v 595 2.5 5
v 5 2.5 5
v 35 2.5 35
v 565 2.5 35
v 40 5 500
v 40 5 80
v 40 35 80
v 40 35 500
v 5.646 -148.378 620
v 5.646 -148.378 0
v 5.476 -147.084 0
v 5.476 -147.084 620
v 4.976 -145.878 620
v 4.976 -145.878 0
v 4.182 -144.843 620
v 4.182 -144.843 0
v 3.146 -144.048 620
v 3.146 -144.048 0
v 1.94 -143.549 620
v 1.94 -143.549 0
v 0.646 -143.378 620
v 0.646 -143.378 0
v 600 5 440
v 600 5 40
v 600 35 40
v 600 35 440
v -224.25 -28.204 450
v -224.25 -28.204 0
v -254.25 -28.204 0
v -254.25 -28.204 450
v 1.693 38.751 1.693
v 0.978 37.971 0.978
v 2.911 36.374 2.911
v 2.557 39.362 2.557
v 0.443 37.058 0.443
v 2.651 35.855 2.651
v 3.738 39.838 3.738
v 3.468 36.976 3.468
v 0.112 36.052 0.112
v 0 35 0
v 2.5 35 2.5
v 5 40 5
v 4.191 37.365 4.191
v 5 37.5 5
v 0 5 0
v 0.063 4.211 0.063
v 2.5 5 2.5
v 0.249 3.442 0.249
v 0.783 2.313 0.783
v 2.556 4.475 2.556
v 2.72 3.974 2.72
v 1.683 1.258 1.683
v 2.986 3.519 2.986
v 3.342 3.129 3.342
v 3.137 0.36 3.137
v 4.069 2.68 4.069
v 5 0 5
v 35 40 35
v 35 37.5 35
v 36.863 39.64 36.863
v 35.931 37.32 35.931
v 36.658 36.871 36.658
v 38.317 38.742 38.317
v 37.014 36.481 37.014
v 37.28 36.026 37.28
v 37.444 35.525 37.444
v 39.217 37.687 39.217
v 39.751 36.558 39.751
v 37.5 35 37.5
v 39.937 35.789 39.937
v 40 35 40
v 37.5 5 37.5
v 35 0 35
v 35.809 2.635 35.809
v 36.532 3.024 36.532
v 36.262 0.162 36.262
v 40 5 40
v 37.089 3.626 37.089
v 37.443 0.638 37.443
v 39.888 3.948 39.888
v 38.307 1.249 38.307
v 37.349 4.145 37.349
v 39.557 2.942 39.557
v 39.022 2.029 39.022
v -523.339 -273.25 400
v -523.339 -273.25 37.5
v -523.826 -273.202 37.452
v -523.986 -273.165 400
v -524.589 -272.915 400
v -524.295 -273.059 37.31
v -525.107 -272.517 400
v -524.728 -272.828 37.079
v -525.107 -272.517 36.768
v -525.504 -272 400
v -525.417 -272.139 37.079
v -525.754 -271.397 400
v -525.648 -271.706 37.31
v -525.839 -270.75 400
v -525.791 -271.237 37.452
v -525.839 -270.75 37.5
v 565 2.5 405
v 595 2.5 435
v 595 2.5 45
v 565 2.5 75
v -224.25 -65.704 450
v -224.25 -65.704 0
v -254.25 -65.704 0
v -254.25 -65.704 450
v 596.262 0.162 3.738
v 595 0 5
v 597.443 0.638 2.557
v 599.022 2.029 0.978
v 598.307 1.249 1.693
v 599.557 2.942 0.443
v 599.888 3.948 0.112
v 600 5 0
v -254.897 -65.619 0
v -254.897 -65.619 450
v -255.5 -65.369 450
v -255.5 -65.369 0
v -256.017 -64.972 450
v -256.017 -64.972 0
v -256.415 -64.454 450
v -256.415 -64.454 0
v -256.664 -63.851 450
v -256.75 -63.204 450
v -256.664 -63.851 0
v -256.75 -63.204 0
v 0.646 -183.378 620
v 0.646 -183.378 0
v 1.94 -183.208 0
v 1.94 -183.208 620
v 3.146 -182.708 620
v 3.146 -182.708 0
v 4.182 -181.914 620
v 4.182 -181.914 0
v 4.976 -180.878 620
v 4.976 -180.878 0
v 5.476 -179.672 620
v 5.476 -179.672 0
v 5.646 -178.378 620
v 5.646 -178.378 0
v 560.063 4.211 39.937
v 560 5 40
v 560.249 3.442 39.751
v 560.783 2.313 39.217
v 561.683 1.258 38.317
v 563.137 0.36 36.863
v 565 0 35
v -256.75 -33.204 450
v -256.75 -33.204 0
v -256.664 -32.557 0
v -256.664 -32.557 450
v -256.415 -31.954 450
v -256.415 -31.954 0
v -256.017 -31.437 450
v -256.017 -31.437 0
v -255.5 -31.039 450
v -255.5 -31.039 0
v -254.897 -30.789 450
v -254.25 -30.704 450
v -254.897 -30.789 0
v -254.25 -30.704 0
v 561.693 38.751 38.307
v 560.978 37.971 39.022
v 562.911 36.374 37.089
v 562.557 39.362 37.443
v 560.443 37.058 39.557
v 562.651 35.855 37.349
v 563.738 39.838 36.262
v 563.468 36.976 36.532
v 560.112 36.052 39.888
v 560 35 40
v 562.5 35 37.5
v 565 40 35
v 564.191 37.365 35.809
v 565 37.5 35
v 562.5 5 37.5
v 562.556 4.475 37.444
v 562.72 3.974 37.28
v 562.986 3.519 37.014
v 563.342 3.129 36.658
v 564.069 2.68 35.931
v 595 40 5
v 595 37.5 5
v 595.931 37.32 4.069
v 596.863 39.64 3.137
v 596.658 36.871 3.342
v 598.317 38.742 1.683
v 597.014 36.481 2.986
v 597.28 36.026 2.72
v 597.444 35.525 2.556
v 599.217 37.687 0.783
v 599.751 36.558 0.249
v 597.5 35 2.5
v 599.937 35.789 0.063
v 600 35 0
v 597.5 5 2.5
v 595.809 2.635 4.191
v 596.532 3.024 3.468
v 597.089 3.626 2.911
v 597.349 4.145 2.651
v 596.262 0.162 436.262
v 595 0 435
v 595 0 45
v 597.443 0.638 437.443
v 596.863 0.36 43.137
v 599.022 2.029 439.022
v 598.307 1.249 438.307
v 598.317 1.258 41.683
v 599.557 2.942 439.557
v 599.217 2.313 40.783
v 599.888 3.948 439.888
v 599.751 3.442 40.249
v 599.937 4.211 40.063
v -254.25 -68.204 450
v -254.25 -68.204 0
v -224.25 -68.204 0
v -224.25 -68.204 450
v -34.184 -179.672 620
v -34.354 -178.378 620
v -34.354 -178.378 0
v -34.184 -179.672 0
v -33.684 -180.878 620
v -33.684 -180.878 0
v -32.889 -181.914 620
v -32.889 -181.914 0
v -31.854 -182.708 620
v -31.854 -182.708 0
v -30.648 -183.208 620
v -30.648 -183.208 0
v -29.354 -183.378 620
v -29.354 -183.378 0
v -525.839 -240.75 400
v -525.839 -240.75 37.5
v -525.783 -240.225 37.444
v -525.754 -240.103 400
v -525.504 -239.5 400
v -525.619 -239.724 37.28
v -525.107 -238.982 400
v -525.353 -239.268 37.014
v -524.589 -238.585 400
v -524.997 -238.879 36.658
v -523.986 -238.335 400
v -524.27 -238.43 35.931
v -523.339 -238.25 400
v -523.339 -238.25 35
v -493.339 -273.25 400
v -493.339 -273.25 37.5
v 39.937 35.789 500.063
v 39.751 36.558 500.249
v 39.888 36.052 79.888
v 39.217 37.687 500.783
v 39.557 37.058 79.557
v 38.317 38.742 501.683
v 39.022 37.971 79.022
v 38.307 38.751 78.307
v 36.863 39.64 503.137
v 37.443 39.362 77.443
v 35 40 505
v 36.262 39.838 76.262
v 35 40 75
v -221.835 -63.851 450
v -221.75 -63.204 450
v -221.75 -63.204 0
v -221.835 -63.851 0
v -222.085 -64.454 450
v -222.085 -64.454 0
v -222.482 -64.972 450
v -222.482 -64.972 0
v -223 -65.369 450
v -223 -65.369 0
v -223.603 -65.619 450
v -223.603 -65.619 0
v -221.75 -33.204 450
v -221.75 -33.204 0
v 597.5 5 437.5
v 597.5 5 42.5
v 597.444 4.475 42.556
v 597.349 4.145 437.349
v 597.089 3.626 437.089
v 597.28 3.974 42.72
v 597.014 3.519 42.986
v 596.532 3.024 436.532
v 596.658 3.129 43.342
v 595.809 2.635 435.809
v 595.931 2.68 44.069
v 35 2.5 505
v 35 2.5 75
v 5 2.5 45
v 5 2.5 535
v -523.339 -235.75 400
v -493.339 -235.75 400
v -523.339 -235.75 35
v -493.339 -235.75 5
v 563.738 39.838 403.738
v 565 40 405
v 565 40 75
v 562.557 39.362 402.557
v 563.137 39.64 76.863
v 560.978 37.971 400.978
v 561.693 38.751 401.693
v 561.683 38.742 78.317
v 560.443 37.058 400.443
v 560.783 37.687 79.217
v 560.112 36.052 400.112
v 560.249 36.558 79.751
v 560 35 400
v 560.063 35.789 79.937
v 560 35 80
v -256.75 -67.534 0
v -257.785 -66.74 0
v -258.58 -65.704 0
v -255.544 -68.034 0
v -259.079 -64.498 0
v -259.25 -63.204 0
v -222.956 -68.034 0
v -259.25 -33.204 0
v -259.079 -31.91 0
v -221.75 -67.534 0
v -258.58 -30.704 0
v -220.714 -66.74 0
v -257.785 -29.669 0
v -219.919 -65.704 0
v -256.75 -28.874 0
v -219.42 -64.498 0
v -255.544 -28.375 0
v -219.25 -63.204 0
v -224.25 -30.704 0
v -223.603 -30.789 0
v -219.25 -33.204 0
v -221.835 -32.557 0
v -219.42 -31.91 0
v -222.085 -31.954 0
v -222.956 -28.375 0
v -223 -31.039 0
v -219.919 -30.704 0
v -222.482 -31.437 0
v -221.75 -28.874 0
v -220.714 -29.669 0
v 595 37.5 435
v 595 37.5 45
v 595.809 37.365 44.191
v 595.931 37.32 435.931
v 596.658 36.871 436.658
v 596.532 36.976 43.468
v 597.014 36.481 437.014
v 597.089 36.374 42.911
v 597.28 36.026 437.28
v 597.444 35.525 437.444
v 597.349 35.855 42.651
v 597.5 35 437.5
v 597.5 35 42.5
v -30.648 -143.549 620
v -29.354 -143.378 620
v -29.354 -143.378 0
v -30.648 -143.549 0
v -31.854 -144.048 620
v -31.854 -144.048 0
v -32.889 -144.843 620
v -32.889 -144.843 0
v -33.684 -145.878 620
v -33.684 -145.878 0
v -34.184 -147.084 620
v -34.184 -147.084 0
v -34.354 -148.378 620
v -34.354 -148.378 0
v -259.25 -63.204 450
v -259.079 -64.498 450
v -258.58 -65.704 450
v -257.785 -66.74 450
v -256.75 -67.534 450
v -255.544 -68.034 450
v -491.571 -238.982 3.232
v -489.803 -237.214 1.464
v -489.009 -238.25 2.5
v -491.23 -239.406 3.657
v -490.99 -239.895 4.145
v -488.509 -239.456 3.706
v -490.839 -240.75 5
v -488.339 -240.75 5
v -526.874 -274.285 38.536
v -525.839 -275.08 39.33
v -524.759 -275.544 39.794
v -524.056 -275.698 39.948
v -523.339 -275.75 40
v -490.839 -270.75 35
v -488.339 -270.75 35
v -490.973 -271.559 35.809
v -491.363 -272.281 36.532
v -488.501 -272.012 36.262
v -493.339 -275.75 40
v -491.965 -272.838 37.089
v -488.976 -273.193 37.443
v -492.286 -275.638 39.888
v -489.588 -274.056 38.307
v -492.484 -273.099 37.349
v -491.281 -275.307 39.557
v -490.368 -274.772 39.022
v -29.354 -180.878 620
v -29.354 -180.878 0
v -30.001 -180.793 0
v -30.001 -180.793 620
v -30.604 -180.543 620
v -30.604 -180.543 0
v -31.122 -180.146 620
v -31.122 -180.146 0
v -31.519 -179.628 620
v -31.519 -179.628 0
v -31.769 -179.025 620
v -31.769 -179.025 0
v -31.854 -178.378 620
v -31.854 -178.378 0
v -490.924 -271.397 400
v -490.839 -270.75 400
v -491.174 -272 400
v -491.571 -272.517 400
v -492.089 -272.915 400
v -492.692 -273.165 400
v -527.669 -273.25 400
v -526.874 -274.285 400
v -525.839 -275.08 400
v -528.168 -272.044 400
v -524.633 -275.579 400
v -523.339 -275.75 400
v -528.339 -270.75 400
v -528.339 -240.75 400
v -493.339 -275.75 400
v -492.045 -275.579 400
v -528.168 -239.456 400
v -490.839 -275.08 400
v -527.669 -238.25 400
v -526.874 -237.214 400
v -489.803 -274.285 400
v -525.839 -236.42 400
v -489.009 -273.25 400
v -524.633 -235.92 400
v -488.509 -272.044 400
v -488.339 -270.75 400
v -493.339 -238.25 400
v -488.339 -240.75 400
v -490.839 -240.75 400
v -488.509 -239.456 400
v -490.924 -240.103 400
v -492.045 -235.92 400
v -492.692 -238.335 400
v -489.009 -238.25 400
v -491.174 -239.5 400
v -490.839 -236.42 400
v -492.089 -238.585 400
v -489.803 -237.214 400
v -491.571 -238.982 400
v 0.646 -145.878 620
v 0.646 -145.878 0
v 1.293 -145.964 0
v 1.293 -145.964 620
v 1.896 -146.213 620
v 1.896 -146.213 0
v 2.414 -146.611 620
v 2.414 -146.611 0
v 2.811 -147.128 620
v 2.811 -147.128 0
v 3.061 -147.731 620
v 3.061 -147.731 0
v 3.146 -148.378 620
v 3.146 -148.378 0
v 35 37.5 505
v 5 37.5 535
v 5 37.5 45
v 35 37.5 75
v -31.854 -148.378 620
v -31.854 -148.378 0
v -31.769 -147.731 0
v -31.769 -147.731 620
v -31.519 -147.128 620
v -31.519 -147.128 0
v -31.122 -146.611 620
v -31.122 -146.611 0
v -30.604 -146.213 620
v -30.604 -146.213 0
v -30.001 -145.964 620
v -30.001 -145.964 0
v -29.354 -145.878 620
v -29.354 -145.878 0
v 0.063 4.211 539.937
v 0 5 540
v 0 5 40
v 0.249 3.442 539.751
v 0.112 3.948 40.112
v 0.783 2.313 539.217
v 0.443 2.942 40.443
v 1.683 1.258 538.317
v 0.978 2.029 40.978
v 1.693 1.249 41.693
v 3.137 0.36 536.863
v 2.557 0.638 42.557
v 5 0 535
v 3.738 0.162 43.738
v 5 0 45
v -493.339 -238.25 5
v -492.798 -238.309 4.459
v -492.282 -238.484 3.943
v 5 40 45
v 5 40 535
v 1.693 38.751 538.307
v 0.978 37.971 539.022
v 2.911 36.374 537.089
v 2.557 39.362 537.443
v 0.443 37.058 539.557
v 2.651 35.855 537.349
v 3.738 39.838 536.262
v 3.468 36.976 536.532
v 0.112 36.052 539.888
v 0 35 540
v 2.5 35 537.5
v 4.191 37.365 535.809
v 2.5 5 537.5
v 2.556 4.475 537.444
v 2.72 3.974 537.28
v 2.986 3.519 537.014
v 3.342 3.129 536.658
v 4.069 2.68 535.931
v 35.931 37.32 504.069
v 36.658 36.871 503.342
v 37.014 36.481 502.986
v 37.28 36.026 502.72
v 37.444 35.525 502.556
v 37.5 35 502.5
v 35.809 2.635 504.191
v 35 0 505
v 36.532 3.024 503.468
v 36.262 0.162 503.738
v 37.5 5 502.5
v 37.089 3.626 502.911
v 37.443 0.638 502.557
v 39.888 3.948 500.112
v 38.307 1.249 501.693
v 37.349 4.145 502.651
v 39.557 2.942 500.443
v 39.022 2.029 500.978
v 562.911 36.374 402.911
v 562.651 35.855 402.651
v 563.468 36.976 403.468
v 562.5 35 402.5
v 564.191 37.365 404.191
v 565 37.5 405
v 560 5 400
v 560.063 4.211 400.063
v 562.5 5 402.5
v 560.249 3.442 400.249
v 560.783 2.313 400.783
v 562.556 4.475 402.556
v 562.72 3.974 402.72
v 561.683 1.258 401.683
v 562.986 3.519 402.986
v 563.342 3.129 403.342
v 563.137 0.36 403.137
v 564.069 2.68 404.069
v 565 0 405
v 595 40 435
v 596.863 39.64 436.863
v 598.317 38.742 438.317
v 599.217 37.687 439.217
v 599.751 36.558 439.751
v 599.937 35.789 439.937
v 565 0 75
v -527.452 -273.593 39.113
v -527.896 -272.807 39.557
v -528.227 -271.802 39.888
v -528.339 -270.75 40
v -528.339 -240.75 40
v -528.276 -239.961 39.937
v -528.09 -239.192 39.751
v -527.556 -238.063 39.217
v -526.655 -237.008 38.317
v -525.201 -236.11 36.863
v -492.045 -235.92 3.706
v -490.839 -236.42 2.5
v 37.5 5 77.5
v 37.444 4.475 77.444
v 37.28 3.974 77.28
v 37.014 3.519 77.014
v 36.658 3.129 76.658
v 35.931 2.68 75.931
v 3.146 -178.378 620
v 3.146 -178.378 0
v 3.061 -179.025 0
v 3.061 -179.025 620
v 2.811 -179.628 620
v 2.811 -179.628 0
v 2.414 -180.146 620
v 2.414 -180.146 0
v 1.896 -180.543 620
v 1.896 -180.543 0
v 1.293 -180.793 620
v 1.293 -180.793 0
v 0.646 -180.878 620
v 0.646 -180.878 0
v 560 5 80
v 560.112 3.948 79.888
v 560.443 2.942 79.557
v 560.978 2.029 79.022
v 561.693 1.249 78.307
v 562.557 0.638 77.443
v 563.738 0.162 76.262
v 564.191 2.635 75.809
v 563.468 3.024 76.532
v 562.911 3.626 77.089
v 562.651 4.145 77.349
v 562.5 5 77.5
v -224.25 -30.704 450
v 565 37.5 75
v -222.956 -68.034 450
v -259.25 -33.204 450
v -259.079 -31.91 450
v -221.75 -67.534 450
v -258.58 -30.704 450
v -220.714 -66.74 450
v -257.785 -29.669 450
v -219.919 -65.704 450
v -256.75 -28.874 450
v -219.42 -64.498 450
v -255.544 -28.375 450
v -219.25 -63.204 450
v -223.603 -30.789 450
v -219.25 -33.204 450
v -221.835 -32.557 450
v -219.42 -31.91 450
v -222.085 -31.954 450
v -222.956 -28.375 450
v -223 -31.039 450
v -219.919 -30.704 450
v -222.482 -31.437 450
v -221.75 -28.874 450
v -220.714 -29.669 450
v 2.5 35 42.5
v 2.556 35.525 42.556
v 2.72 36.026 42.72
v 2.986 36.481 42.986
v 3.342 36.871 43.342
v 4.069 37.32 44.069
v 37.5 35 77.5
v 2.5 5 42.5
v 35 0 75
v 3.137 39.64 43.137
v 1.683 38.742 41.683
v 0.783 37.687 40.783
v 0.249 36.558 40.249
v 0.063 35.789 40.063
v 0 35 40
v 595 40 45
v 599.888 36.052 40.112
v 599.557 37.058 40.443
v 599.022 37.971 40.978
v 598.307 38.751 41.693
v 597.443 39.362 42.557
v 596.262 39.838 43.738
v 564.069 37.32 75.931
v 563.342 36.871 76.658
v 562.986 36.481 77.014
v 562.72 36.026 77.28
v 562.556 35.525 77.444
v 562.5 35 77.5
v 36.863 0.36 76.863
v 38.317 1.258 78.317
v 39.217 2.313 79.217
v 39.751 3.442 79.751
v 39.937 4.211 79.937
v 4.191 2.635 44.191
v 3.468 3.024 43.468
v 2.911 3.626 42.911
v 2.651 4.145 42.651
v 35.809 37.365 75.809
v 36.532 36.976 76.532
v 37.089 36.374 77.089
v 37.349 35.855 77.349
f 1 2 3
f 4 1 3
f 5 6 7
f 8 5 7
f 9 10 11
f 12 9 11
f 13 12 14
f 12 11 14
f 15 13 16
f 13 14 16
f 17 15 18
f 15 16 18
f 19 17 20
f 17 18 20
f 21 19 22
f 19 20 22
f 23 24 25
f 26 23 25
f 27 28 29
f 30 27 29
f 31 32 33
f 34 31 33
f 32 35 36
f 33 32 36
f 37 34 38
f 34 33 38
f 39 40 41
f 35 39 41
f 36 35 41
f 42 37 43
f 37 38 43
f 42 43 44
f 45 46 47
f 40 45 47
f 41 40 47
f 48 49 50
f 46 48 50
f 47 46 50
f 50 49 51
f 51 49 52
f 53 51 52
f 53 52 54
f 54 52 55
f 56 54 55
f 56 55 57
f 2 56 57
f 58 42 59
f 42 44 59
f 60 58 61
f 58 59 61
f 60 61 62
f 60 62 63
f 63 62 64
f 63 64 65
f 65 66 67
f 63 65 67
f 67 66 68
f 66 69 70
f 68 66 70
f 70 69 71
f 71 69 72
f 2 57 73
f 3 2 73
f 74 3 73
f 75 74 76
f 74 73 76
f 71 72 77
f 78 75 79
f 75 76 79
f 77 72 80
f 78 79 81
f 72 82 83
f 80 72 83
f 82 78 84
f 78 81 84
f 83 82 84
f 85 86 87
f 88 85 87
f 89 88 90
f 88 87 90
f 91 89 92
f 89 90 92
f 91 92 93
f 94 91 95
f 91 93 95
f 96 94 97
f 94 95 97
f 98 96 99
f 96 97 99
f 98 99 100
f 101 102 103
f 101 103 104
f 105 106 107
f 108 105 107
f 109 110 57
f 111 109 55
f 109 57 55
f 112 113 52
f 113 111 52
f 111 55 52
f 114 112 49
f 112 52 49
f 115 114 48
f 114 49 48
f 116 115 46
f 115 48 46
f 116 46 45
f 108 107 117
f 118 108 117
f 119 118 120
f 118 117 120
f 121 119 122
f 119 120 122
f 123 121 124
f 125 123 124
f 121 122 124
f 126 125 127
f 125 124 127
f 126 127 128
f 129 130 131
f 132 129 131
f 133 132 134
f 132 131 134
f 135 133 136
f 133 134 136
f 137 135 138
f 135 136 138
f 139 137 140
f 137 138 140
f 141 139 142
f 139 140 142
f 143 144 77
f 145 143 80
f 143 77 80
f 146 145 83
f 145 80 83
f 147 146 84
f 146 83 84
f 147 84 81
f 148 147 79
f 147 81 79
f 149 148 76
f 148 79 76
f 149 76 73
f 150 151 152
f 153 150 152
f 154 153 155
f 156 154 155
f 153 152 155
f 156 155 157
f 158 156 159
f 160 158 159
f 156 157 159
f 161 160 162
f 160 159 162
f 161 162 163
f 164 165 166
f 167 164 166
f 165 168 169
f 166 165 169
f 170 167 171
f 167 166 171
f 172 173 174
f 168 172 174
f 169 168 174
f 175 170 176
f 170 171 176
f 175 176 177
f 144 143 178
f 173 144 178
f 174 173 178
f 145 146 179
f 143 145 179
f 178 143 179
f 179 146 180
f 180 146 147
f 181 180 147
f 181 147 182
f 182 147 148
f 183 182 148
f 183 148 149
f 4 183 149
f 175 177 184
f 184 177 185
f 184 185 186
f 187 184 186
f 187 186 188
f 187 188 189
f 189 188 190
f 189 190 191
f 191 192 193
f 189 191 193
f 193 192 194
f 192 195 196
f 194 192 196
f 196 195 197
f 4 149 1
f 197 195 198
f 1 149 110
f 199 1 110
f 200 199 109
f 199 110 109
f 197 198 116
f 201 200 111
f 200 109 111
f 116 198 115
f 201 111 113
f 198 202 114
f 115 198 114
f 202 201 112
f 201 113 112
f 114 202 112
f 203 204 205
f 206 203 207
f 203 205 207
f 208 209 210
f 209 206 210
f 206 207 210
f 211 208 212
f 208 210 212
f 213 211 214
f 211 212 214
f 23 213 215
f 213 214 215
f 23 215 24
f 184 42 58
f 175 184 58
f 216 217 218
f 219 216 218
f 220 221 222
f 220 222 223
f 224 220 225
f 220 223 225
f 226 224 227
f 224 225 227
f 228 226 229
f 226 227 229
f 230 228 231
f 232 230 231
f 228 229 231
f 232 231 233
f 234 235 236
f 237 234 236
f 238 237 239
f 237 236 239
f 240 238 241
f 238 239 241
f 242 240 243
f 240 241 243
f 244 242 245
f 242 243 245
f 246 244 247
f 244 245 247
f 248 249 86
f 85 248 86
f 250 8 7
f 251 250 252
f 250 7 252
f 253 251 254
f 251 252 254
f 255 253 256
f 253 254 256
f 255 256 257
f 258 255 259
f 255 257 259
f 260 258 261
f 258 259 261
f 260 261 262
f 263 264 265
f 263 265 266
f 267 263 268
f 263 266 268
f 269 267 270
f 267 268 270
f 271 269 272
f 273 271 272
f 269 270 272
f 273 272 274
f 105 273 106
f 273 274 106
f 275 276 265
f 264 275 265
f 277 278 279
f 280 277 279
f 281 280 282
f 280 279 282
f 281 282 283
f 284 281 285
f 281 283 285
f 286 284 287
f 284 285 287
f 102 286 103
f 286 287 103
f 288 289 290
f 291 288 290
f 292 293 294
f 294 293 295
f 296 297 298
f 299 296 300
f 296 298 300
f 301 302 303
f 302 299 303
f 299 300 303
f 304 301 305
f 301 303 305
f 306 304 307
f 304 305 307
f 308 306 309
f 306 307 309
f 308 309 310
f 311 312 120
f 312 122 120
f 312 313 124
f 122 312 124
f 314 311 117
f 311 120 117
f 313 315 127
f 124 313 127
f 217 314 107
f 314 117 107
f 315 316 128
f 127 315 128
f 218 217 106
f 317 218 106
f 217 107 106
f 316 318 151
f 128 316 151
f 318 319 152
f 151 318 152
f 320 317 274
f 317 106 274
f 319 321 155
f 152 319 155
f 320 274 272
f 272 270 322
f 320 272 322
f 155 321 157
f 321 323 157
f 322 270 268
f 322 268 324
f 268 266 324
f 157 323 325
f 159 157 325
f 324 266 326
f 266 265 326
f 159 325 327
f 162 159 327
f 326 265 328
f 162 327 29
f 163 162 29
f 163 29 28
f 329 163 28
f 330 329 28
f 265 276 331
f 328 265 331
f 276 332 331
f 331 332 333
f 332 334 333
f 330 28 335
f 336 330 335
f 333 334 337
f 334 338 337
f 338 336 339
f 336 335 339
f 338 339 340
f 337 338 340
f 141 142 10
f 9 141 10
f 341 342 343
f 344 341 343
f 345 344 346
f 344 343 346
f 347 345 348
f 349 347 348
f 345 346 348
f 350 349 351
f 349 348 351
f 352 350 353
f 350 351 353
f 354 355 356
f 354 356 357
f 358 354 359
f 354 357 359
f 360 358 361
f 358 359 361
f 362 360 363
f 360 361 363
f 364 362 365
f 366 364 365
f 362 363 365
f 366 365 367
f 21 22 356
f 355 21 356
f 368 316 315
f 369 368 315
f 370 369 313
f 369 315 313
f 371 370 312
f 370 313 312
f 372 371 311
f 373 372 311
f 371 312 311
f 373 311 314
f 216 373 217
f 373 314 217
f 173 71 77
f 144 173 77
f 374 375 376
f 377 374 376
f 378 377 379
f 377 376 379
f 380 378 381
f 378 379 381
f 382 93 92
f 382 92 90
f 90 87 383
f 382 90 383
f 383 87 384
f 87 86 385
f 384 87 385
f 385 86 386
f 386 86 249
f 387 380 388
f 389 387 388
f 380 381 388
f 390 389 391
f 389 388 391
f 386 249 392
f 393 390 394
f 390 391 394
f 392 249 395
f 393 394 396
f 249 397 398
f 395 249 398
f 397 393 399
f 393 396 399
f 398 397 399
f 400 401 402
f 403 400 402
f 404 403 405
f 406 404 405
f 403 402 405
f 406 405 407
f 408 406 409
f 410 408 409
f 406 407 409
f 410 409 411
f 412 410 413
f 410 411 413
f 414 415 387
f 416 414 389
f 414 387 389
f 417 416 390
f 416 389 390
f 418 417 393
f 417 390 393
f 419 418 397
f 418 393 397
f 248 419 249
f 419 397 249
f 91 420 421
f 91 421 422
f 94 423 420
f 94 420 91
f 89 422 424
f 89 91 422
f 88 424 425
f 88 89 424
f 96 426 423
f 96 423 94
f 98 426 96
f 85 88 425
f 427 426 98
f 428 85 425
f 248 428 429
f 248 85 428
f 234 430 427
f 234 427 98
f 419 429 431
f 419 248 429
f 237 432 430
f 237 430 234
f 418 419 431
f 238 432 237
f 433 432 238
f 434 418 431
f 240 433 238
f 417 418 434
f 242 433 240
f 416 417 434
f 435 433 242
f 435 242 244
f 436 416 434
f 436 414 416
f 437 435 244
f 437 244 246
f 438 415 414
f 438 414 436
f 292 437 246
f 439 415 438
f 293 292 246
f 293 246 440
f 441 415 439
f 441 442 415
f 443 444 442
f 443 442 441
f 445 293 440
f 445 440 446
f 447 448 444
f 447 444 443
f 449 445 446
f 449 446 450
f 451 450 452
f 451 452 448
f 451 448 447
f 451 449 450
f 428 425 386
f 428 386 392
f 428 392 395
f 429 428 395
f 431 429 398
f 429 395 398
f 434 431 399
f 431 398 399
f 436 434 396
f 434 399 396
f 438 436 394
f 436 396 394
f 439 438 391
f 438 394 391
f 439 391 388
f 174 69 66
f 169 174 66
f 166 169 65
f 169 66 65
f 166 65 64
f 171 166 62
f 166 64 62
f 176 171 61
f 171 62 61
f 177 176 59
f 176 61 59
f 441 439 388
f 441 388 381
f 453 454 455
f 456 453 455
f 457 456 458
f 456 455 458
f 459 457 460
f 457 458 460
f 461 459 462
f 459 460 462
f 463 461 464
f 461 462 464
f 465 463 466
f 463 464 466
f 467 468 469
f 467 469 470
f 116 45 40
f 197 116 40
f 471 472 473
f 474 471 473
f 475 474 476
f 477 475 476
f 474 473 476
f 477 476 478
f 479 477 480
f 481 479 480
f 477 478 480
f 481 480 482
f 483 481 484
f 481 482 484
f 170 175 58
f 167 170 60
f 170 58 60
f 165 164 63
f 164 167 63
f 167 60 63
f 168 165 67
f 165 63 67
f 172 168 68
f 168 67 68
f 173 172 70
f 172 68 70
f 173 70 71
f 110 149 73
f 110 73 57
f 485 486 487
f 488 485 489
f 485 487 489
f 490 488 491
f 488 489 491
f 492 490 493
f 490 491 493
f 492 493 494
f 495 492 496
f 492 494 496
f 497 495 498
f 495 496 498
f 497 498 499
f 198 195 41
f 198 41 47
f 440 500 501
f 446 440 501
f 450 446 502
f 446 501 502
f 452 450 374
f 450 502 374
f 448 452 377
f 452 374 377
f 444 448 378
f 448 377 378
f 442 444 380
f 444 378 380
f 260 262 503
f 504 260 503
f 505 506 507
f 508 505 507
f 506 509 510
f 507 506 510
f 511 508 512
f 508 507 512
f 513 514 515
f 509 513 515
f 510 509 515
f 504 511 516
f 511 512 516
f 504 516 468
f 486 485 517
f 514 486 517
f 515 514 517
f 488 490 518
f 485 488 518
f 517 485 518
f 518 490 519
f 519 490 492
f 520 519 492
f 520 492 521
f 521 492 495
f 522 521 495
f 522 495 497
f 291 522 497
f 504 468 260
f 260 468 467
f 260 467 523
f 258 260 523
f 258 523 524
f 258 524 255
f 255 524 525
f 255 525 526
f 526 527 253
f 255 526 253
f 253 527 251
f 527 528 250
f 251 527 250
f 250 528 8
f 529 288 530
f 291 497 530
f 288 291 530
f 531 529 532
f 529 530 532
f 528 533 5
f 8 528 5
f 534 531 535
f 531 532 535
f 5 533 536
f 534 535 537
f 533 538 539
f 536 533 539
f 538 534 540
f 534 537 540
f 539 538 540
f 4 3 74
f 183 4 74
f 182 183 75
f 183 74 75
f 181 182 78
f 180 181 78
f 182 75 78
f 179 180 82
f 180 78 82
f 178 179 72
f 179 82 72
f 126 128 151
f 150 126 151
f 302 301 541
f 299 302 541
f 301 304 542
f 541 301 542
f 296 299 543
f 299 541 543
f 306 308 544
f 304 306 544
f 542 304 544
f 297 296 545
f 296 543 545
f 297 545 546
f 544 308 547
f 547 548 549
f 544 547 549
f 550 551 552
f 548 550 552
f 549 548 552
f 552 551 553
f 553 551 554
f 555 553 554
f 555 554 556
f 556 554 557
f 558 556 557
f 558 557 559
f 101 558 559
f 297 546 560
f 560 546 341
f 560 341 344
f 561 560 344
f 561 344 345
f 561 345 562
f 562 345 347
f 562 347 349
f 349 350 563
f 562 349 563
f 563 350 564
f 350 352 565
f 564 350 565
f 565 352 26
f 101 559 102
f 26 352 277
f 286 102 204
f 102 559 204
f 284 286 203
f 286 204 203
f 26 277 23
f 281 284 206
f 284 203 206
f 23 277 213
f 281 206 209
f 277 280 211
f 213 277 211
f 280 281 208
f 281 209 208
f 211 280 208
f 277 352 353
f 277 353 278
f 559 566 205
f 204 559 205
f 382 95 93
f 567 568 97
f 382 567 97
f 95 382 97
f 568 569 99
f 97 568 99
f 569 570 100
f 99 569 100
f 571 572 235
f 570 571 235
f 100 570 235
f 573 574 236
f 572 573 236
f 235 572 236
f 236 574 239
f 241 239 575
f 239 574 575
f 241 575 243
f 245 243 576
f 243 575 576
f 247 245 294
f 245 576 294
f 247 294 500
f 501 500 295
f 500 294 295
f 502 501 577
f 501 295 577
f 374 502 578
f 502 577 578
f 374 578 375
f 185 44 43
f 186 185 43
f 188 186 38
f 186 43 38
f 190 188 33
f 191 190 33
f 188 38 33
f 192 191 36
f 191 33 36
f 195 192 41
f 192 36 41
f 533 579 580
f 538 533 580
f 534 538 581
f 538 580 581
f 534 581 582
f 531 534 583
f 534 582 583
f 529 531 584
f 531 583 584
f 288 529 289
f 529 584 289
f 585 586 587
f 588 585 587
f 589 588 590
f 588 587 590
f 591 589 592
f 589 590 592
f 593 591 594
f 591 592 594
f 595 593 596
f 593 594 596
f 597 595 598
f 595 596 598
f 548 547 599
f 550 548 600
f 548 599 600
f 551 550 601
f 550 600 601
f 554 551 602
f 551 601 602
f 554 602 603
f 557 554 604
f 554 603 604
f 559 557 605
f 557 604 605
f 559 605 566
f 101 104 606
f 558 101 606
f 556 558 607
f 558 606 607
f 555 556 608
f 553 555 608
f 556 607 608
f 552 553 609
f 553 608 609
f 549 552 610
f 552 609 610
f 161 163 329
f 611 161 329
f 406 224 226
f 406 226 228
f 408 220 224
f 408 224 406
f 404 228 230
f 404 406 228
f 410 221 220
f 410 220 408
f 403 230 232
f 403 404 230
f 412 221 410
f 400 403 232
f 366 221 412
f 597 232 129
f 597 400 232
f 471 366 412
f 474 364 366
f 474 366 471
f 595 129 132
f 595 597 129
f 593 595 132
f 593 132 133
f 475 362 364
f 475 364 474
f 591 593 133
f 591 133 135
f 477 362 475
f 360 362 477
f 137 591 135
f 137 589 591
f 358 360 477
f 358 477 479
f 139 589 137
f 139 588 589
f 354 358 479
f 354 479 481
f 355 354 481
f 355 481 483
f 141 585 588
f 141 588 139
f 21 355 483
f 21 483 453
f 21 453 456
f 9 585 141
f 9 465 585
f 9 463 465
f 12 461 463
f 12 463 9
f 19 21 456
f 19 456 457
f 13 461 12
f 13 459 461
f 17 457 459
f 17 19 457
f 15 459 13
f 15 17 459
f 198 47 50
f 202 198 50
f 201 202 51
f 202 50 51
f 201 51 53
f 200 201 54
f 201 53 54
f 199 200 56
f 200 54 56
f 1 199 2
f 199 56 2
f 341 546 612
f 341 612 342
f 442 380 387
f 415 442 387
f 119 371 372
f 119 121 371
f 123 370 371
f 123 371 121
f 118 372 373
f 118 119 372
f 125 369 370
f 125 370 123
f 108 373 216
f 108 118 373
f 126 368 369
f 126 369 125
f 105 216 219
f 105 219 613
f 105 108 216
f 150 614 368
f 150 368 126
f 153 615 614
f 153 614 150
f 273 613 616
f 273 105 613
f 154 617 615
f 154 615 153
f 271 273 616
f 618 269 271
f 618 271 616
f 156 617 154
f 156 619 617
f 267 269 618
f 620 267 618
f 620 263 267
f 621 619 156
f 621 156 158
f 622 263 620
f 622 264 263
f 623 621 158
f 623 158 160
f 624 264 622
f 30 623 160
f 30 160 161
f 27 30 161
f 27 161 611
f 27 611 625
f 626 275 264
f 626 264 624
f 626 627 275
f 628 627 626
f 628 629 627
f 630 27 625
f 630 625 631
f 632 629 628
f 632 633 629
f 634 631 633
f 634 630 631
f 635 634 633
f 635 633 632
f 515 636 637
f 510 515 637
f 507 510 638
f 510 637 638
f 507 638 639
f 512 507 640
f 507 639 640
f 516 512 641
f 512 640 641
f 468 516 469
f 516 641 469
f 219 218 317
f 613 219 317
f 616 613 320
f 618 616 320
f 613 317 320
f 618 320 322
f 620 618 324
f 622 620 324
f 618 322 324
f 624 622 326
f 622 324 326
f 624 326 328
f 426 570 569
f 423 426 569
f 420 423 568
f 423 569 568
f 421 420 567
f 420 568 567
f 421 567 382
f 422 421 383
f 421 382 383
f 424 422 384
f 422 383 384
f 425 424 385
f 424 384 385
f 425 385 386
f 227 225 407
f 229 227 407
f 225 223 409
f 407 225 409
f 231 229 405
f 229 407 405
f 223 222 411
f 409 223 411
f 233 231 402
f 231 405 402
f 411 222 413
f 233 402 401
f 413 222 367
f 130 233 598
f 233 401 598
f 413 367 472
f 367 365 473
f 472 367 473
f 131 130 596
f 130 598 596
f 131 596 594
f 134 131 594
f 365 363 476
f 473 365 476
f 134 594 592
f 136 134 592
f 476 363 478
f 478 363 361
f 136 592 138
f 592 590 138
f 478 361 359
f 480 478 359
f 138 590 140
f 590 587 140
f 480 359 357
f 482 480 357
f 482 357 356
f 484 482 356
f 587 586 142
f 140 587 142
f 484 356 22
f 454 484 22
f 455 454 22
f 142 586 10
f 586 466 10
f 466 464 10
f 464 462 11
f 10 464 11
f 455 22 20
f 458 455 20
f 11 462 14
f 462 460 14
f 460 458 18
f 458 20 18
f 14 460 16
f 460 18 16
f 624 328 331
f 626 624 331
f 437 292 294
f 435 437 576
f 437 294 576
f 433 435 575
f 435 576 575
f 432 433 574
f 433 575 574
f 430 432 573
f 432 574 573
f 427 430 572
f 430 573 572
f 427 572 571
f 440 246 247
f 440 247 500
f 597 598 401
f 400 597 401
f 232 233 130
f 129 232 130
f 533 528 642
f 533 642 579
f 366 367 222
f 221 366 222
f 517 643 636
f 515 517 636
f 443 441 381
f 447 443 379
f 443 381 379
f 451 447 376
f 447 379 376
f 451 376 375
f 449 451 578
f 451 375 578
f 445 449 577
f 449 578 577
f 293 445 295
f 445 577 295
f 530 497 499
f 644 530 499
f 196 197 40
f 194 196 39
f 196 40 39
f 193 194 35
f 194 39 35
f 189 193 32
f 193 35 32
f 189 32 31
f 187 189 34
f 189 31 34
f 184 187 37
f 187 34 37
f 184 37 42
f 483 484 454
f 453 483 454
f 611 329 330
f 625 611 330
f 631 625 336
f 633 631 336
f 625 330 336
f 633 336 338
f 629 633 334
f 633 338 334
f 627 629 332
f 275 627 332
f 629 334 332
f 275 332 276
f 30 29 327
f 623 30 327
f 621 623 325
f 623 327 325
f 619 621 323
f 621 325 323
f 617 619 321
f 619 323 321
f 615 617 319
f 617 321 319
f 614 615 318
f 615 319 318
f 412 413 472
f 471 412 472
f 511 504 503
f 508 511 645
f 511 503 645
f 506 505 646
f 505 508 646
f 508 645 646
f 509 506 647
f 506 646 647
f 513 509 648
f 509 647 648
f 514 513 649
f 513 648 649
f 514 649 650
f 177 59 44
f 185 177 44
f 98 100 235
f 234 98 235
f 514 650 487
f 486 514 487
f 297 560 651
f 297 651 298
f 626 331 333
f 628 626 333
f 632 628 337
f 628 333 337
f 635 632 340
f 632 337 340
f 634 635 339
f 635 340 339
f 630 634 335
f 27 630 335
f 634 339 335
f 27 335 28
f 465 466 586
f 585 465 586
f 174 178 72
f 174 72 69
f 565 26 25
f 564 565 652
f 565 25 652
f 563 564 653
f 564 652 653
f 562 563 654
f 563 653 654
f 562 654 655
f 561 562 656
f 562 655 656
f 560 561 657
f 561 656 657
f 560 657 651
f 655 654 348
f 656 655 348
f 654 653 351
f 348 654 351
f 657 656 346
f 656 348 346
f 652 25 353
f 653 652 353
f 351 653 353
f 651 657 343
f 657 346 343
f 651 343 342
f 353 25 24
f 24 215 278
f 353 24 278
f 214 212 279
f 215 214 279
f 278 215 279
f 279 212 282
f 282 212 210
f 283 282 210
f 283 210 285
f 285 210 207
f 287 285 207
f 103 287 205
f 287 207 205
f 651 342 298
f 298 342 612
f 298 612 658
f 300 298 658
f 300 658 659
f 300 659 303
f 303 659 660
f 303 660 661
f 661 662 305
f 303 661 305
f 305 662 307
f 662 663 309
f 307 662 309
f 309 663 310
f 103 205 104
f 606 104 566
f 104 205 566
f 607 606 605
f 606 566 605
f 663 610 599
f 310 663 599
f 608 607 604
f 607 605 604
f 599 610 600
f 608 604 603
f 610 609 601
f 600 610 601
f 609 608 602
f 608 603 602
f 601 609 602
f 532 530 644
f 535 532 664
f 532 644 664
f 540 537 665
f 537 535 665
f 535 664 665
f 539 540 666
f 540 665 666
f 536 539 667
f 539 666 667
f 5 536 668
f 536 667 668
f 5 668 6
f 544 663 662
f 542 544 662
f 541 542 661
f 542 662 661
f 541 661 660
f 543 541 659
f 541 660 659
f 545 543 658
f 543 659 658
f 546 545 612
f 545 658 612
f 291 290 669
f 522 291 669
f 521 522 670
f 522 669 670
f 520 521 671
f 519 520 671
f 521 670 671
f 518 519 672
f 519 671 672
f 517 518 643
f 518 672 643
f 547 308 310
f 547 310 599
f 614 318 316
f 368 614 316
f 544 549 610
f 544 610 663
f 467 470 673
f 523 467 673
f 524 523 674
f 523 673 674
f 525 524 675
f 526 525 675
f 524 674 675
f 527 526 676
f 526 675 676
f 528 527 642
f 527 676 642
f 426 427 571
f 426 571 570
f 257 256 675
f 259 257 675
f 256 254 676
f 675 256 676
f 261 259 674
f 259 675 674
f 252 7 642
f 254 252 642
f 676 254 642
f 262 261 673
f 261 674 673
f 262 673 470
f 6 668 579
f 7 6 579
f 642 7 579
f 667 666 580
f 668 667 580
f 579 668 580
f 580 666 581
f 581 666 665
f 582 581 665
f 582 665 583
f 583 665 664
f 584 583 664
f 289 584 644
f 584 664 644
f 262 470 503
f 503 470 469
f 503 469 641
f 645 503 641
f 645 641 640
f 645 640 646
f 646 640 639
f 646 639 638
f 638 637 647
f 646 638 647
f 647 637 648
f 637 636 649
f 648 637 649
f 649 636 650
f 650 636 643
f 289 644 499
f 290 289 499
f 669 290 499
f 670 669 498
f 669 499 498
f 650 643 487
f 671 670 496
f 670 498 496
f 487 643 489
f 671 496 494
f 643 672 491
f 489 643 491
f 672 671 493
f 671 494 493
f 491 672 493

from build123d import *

# Parameters (mm, degrees)
F1_DEPTH  = 600
F3_DEPTH  = 40.001
F5_DEPTH  = 500
F7_DEPTH  = 40.001
F9_DEPTH  = 400
F11_DEPTH = 40.001
F13_DEPTH = 620
F15_DEPTH = 450
F17_DEPTH = 400
F20_DEPTH = 40.001
F21_DEPTH = 40.001


with BuildPart() as f1:
    # F0 (on Right) → F1 (new body)
    with BuildSketch(Plane.YZ):
        with BuildLine():
            ThreePointArc((0, 5), (1.464466, 1.464466), (5, 0))
            Line((5, 0), (35, 0))
            ThreePointArc((35, 0), (38.535534, 1.464466), (40, 5))
            Line((40, 5), (40, 35))
            ThreePointArc((40, 35), (38.535534, 38.535534), (35, 40))
            Line((35, 40), (5, 40))
            ThreePointArc((5, 40), (1.464466, 38.535534), (0, 35))
            Line((0, 35), (0, 5))
        make_face()
        with BuildLine():
            ThreePointArc((37.5, 5), (36.767767, 3.232233), (35, 2.5))
            Line((35, 2.5), (5, 2.5))
            ThreePointArc((5, 2.5), (3.232233, 3.232233), (2.5, 5))
            Line((2.5, 5), (2.5, 35))
            ThreePointArc((2.5, 35), (3.232233, 36.767767), (5, 37.5))
            Line((5, 37.5), (35, 37.5))
            ThreePointArc((35, 37.5), (36.767767, 36.767767), (37.5, 35))
            Line((37.5, 35), (37.5, 5))
        make_face(mode=Mode.SUBTRACT)
    extrude(amount=F1_DEPTH)

    # F2 (on face) → F3 (cut, through all)
    with BuildSketch(Plane.XZ):
        Polygon((0, 40), (0, 0), (40, 40), align=None)
        Polygon((560, 40), (600, 0), (600, 40), align=None)
    extrude(amount=-F3_DEPTH, mode=Mode.SUBTRACT)


with BuildPart() as f5:
    # F4 (on face) → F5 (new body)
    with BuildSketch(Plane.XY.offset(40)):
        with BuildLine():
            ThreePointArc((0, 5), (1.464466, 1.464466), (5, 0))
            Line((5, 0), (35, 0))
            ThreePointArc((35, 0), (38.535534, 1.464466), (40, 5))
            Line((40, 5), (40, 35))
            ThreePointArc((40, 35), (38.535534, 38.535534), (35, 40))
            Line((35, 40), (5, 40))
            ThreePointArc((5, 40), (1.464466, 38.535534), (0, 35))
            Line((0, 35), (0, 5))
        make_face()
        with BuildLine():
            ThreePointArc((37.5, 5), (36.767767, 3.232233), (35, 2.5))
            Line((35, 2.5), (5, 2.5))
            ThreePointArc((5, 2.5), (3.232233, 3.232233), (2.5, 5))
            Line((2.5, 5), (2.5, 35))
            ThreePointArc((2.5, 35), (3.232233, 36.767767), (5, 37.5))
            Line((5, 37.5), (35, 37.5))
            ThreePointArc((35, 37.5), (36.767767, 36.767767), (37.5, 35))
            Line((37.5, 35), (37.5, 5))
        make_face(mode=Mode.SUBTRACT)
    extrude(amount=F5_DEPTH)

    # F6 (on face) → F7 (cut, through all)
    with BuildSketch(Plane.XZ):
        Polygon((40, 80), (0, 40), (40, 40), align=None)
        Polygon((40, 500), (40, 540), (0, 540), align=None)
    extrude(amount=-F7_DEPTH, mode=Mode.SUBTRACT)


with BuildPart() as f9:
    # F8 (on face) → F9 (new body)
    with BuildSketch(Plane.XY.offset(40)):
        with BuildLine():
            ThreePointArc((560, 5), (561.464466, 1.464466), (565, 0))
            Line((565, 0), (595, 0))
            ThreePointArc((595, 0), (598.535534, 1.464466), (600, 5))
            Line((600, 5), (600, 35))
            ThreePointArc((600, 35), (598.535534, 38.535534), (595, 40))
            Line((595, 40), (565, 40))
            ThreePointArc((565, 40), (561.464466, 38.535534), (560, 35))
            Line((560, 35), (560, 5))
        make_face()
        with BuildLine():
            ThreePointArc((597.5, 5), (596.767767, 3.232233), (595, 2.5))
            Line((595, 2.5), (565, 2.5))
            ThreePointArc((565, 2.5), (563.232233, 3.232233), (562.5, 5))
            Line((562.5, 5), (562.5, 35))
            ThreePointArc((562.5, 35), (563.232233, 36.767767), (565, 37.5))
            Line((565, 37.5), (595, 37.5))
            ThreePointArc((595, 37.5), (596.767767, 36.767767), (597.5, 35))
            Line((597.5, 35), (597.5, 5))
        make_face(mode=Mode.SUBTRACT)
    extrude(amount=F9_DEPTH)

    # F10 (on face) → F11 (cut, through all)
    with BuildSketch(Plane.XZ):
        Polygon((560, 400), (600, 440), (560, 440), align=None)
        Polygon((600, 40), (560, 80), (560, 40), align=None)
    extrude(amount=-F11_DEPTH, mode=Mode.SUBTRACT)


with BuildPart() as f13:
    # F12 (on Top) → F13 (new body)
    with BuildSketch(Plane.XY):
        with BuildLine():
            ThreePointArc((-34.353931, -178.378343), (-32.889465, -181.913877), (-29.353931, -183.378343))
            Line((-29.353931, -183.378343), (0.646069, -183.378343))
            ThreePointArc((0.646069, -183.378343), (4.181603, -181.913877), (5.646069, -178.378343))
            Line((5.646069, -178.378343), (5.646069, -148.378343))
            ThreePointArc((5.646069, -148.378343), (4.181603, -144.842809), (0.646069, -143.378343))
            Line((0.646069, -143.378343), (-29.353931, -143.378343))
            ThreePointArc((-29.353931, -143.378343), (-32.889465, -144.842809), (-34.353931, -148.378343))
            Line((-34.353931, -148.378343), (-34.353931, -178.378343))
        make_face()
        with BuildLine():
            ThreePointArc((3.146069, -178.378343), (2.413836, -180.14611), (0.646069, -180.878343))
            Line((0.646069, -180.878343), (-29.353931, -180.878343))
            ThreePointArc((-29.353931, -180.878343), (-31.121698, -180.14611), (-31.853931, -178.378343))
            Line((-31.853931, -178.378343), (-31.853931, -148.378343))
            ThreePointArc((-31.853931, -148.378343), (-31.121698, -146.610576), (-29.353931, -145.878343))
            Line((-29.353931, -145.878343), (0.646069, -145.878343))
            ThreePointArc((0.646069, -145.878343), (2.413836, -146.610576), (3.146069, -148.378343))
            Line((3.146069, -148.378343), (3.146069, -178.378343))
        make_face(mode=Mode.SUBTRACT)
    extrude(amount=F13_DEPTH)


with BuildPart() as f15:
    # F14 (on Top) → F15 (new body)
    with BuildSketch(Plane.XY):
        with BuildLine():
            ThreePointArc((-259.249617, -63.204307), (-257.785151, -66.73984), (-254.249617, -68.204307))
            Line((-254.249617, -68.204307), (-224.249617, -68.204307))
            ThreePointArc((-224.249617, -68.204307), (-220.714083, -66.73984), (-219.249617, -63.204307))
            Line((-219.249617, -63.204307), (-219.249617, -33.204307))
            ThreePointArc((-219.249617, -33.204307), (-220.714083, -29.668773), (-224.249617, -28.204307))
            Line((-224.249617, -28.204307), (-254.249617, -28.204307))
            ThreePointArc((-254.249617, -28.204307), (-257.785151, -29.668773), (-259.249617, -33.204307))
            Line((-259.249617, -33.204307), (-259.249617, -63.204307))
        make_face()
        with BuildLine():
            ThreePointArc((-221.749617, -63.204307), (-222.48185, -64.972073), (-224.249617, -65.704307))
            Line((-224.249617, -65.704307), (-254.249617, -65.704307))
            ThreePointArc((-254.249617, -65.704307), (-256.017384, -64.972073), (-256.749617, -63.204307))
            Line((-256.749617, -63.204307), (-256.749617, -33.204307))
            ThreePointArc((-256.749617, -33.204307), (-256.017384, -31.43654), (-254.249617, -30.704307))
            Line((-254.249617, -30.704307), (-224.249617, -30.704307))
            ThreePointArc((-224.249617, -30.704307), (-222.48185, -31.43654), (-221.749617, -33.204307))
            Line((-221.749617, -33.204307), (-221.749617, -63.204307))
        make_face(mode=Mode.SUBTRACT)
    extrude(amount=F15_DEPTH)


with BuildPart() as f17:
    # F16 (on Top) → F17 (new body)
    with BuildSketch(Plane.XY):
        with BuildLine():
            ThreePointArc((-528.338749, -270.749702), (-526.874283, -274.285236), (-523.338749, -275.749702))
            Line((-523.338749, -275.749702), (-493.338749, -275.749702))
            ThreePointArc((-493.338749, -275.749702), (-489.803216, -274.285236), (-488.338749, -270.749702))
            Line((-488.338749, -270.749702), (-488.338749, -240.749702))
            ThreePointArc((-488.338749, -240.749702), (-489.803216, -237.214169), (-493.338749, -235.749702))
            Line((-493.338749, -235.749702), (-523.338749, -235.749702))
            ThreePointArc((-523.338749, -235.749702), (-526.874283, -237.214169), (-528.338749, -240.749702))
            Line((-528.338749, -240.749702), (-528.338749, -270.749702))
        make_face()
        with BuildLine():
            ThreePointArc((-490.838749, -270.749702), (-491.570982, -272.517469), (-493.338749, -273.249702))
            Line((-493.338749, -273.249702), (-523.338749, -273.249702))
            ThreePointArc((-523.338749, -273.249702), (-525.106516, -272.517469), (-525.838749, -270.749702))
            Line((-525.838749, -270.749702), (-525.838749, -240.749702))
            ThreePointArc((-525.838749, -240.749702), (-525.106516, -238.981936), (-523.338749, -238.249702))
            Line((-523.338749, -238.249702), (-493.338749, -238.249702))
            ThreePointArc((-493.338749, -238.249702), (-491.570982, -238.981936), (-490.838749, -240.749702))
            Line((-490.838749, -240.749702), (-490.838749, -270.749702))
        make_face(mode=Mode.SUBTRACT)
    extrude(amount=F17_DEPTH)

    # F18 (on face) → F20 (cut, through all)
    with BuildSketch(Plane.YZ.offset(-488.338749)):
        Polygon((-275.749702, 0), (-235.749702, 0), (-275.749702, 40), align=None)
    extrude(amount=-F20_DEPTH, mode=Mode.SUBTRACT)

    # F19 (on face) → F21 (cut, through all)
    with BuildSketch(Plane(origin=(0, -235.749702, 0), x_dir=(-1, 0, 0), z_dir=(0, 1, 0))):
        Polygon((528.338749, 0), (528.338749, 40), (488.338749, 0), align=None)
    extrude(amount=-F21_DEPTH, mode=Mode.SUBTRACT)


solid = Compound([f1.part, f5.part, f9.part, f13.part, f15.part, f17.part])
